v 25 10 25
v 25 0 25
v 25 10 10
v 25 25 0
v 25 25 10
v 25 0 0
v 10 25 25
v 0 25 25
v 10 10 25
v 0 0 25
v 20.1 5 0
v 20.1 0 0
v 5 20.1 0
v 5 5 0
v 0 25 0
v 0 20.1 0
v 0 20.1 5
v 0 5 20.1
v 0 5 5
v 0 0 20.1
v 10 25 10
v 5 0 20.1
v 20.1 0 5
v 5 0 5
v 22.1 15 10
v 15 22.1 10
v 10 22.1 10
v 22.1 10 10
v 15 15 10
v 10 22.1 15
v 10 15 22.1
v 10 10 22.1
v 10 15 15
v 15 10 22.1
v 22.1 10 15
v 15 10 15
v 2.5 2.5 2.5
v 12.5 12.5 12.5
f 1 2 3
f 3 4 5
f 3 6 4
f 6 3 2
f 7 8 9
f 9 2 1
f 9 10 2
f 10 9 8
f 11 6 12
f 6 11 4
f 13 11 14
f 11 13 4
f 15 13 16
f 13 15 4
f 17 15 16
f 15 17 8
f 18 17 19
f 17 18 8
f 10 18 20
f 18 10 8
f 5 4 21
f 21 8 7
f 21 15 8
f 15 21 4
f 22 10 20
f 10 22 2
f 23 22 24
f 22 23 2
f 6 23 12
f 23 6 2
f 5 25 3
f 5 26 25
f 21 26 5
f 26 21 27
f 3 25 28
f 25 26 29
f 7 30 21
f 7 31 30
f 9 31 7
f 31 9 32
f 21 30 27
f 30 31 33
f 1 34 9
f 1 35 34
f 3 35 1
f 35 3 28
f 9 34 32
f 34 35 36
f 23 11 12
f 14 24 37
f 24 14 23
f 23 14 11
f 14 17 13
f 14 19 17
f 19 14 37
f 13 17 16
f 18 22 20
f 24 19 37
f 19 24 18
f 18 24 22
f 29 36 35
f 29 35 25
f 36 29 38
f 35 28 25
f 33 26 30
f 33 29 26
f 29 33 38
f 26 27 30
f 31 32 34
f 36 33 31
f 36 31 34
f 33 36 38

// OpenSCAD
// External chamfer along X-axis from given point which lies
// on the edge to be chamfered off, marked with "+":
//
//   +-.---
//   |/
//   .
//   |
//
// Point p is at one end, and the other end is at p+[l,0,0],
// (so the sign of l controls the direction to the other end).
//
// w is the size of the chamfer (distance from "+" to "." above).
//
// q=0 -> chamfer to +y,+z
// q=1 -> chamfer to -y,+z
// q=2 -> chamfer to -y,-z
// q=3 -> chamfer to +y,-z
// (Non-integral values of Q can tweak the chamfer angle,
// but the value of w is not preserved.)
//
// The chamfer is defined as a shape that is to be subtracted from
// the original to which the chamfer is applied.
//
module chamferX(p, l, w, q, d)
{
  xl = abs(l);
  xo = min(l,0);
  translate(p)
    rotate([45+q*90,0,0])
      translate([xo-d,0,-w])
        cube(size=[xl+2*d,w/sqrt(2),w*2]);
}

// External chamfer aligned with Y-axis
//
// q=0 -> chamfer to +x,+z
// q=1 -> chamfer to -x,+z
// q=2 -> chamfer to -x,-z
// q=3 -> chamfer to +x,-z
//
module chamferY(p, l, w, q, d)
{
  yl = abs(l);
  yo = min(l,0);
  translate(p)
    rotate([0,-45-q*90,0])
      translate([0,yo-d,-w])
        cube(size=[w/sqrt(2),yl+2*d,w*2]);
}

// External chamfer aligned with Z-axis
//
// q=0 -> chamfer to +x,+y
// q=1 -> chamfer to -x,+y
// q=2 -> chamfer to -y,-y
// q=3 -> chamfer to +y,-y
//
module chamferZ(p, l, w, q, d)
{
  zl = abs(l);
  zo = min(l,0);
  translate(p)
    rotate([0,0,45+q*90])
      translate([0,-w,zo-d])
        cube(size=[w/sqrt(2),w*2,zl+2*d]);
}

// X-axis internal chamfer located on/ending at a given edge;
// marked "+" or "*" here:
//
//   .-*---
//   |/
//   +
//   |
//
// Point p is at one end, and the other end is at p+[l,0,0],
// (so the sign of l controls the direction to the other end).
//
// w is the size of the chamfer (distance from "+" to "." above).
//
// q=0 -> chamfer to +z
// q=1 -> chamfer to -y
// q=2 -> chamfer to -z
// q=3 -> chamfer to +y
//
// Unlike the external chamfer, this defined shape is added to a shape to
// make the chamfer
//
module chamferXint(p, l, w, q, d)
{
  xl = abs(l);
  xo = min(l,0);
  translate(p)
    rotate([+45+q*90,0,0])
      translate([xo-d,0,0])
        cube(size=[xl+2*d,w*sqrt(2),w*sqrt(2)]);
}

// Y-axis internal chamfer located on/ending at a given edge
//
// q=0 -> chamfer to +z
// q=1 -> chamfer to -x
// q=2 -> chamfer to -z
// q=3 -> chamfer to +x
module chamferYint(p, l, w, q, d)
{
  yl = abs(l);
  yo = min(l,0);
  translate(p)
    rotate([0,-45-q*90,0])
      translate([0,yo-d,0])
        cube(size=[w*sqrt(2),yl+2*d,w*sqrt(2)]);
}


// Z-axis internal chamfer located on/ending at a given edge
//
// q=0 -> chamfer to +x
// q=1 -> chamfer to -y
// q=2 -> chamfer to -x
// q=3 -> chamfer to +y
module chamferZint(p, l, w, q, d)
{
  zl = abs(l);
  zo = min(l,0);
  translate(p)
    rotate([0,0,-45-q*90])
      translate([0,0,zo-d])
        cube(size=[w*sqrt(2),w*sqrt(2),zl+2*d]);
}

// Examples

union()
{
    difference()
    {
        cube([25,25,25]);
        translate([10,10,10]) cube([25,25,25]);
        chamferX([0,0,0],20,5,0,0.1);
        chamferY([0,0,0],20,5,0,0.1);
        chamferZ([0,0,0],20,5,0,0.1);
    }
   chamferXint([10,15,10],12,5,1,0.1);	// q=1 : -y
   chamferYint([15,10,10],12,5,1,0.1);  // q=1 : -x
   //chamferZint([15,10,10],25,5,2,0.1);  // q=2 : -x
   chamferZint([10,15,10],12,5,1,0.1);  // q=1 : -y
}
